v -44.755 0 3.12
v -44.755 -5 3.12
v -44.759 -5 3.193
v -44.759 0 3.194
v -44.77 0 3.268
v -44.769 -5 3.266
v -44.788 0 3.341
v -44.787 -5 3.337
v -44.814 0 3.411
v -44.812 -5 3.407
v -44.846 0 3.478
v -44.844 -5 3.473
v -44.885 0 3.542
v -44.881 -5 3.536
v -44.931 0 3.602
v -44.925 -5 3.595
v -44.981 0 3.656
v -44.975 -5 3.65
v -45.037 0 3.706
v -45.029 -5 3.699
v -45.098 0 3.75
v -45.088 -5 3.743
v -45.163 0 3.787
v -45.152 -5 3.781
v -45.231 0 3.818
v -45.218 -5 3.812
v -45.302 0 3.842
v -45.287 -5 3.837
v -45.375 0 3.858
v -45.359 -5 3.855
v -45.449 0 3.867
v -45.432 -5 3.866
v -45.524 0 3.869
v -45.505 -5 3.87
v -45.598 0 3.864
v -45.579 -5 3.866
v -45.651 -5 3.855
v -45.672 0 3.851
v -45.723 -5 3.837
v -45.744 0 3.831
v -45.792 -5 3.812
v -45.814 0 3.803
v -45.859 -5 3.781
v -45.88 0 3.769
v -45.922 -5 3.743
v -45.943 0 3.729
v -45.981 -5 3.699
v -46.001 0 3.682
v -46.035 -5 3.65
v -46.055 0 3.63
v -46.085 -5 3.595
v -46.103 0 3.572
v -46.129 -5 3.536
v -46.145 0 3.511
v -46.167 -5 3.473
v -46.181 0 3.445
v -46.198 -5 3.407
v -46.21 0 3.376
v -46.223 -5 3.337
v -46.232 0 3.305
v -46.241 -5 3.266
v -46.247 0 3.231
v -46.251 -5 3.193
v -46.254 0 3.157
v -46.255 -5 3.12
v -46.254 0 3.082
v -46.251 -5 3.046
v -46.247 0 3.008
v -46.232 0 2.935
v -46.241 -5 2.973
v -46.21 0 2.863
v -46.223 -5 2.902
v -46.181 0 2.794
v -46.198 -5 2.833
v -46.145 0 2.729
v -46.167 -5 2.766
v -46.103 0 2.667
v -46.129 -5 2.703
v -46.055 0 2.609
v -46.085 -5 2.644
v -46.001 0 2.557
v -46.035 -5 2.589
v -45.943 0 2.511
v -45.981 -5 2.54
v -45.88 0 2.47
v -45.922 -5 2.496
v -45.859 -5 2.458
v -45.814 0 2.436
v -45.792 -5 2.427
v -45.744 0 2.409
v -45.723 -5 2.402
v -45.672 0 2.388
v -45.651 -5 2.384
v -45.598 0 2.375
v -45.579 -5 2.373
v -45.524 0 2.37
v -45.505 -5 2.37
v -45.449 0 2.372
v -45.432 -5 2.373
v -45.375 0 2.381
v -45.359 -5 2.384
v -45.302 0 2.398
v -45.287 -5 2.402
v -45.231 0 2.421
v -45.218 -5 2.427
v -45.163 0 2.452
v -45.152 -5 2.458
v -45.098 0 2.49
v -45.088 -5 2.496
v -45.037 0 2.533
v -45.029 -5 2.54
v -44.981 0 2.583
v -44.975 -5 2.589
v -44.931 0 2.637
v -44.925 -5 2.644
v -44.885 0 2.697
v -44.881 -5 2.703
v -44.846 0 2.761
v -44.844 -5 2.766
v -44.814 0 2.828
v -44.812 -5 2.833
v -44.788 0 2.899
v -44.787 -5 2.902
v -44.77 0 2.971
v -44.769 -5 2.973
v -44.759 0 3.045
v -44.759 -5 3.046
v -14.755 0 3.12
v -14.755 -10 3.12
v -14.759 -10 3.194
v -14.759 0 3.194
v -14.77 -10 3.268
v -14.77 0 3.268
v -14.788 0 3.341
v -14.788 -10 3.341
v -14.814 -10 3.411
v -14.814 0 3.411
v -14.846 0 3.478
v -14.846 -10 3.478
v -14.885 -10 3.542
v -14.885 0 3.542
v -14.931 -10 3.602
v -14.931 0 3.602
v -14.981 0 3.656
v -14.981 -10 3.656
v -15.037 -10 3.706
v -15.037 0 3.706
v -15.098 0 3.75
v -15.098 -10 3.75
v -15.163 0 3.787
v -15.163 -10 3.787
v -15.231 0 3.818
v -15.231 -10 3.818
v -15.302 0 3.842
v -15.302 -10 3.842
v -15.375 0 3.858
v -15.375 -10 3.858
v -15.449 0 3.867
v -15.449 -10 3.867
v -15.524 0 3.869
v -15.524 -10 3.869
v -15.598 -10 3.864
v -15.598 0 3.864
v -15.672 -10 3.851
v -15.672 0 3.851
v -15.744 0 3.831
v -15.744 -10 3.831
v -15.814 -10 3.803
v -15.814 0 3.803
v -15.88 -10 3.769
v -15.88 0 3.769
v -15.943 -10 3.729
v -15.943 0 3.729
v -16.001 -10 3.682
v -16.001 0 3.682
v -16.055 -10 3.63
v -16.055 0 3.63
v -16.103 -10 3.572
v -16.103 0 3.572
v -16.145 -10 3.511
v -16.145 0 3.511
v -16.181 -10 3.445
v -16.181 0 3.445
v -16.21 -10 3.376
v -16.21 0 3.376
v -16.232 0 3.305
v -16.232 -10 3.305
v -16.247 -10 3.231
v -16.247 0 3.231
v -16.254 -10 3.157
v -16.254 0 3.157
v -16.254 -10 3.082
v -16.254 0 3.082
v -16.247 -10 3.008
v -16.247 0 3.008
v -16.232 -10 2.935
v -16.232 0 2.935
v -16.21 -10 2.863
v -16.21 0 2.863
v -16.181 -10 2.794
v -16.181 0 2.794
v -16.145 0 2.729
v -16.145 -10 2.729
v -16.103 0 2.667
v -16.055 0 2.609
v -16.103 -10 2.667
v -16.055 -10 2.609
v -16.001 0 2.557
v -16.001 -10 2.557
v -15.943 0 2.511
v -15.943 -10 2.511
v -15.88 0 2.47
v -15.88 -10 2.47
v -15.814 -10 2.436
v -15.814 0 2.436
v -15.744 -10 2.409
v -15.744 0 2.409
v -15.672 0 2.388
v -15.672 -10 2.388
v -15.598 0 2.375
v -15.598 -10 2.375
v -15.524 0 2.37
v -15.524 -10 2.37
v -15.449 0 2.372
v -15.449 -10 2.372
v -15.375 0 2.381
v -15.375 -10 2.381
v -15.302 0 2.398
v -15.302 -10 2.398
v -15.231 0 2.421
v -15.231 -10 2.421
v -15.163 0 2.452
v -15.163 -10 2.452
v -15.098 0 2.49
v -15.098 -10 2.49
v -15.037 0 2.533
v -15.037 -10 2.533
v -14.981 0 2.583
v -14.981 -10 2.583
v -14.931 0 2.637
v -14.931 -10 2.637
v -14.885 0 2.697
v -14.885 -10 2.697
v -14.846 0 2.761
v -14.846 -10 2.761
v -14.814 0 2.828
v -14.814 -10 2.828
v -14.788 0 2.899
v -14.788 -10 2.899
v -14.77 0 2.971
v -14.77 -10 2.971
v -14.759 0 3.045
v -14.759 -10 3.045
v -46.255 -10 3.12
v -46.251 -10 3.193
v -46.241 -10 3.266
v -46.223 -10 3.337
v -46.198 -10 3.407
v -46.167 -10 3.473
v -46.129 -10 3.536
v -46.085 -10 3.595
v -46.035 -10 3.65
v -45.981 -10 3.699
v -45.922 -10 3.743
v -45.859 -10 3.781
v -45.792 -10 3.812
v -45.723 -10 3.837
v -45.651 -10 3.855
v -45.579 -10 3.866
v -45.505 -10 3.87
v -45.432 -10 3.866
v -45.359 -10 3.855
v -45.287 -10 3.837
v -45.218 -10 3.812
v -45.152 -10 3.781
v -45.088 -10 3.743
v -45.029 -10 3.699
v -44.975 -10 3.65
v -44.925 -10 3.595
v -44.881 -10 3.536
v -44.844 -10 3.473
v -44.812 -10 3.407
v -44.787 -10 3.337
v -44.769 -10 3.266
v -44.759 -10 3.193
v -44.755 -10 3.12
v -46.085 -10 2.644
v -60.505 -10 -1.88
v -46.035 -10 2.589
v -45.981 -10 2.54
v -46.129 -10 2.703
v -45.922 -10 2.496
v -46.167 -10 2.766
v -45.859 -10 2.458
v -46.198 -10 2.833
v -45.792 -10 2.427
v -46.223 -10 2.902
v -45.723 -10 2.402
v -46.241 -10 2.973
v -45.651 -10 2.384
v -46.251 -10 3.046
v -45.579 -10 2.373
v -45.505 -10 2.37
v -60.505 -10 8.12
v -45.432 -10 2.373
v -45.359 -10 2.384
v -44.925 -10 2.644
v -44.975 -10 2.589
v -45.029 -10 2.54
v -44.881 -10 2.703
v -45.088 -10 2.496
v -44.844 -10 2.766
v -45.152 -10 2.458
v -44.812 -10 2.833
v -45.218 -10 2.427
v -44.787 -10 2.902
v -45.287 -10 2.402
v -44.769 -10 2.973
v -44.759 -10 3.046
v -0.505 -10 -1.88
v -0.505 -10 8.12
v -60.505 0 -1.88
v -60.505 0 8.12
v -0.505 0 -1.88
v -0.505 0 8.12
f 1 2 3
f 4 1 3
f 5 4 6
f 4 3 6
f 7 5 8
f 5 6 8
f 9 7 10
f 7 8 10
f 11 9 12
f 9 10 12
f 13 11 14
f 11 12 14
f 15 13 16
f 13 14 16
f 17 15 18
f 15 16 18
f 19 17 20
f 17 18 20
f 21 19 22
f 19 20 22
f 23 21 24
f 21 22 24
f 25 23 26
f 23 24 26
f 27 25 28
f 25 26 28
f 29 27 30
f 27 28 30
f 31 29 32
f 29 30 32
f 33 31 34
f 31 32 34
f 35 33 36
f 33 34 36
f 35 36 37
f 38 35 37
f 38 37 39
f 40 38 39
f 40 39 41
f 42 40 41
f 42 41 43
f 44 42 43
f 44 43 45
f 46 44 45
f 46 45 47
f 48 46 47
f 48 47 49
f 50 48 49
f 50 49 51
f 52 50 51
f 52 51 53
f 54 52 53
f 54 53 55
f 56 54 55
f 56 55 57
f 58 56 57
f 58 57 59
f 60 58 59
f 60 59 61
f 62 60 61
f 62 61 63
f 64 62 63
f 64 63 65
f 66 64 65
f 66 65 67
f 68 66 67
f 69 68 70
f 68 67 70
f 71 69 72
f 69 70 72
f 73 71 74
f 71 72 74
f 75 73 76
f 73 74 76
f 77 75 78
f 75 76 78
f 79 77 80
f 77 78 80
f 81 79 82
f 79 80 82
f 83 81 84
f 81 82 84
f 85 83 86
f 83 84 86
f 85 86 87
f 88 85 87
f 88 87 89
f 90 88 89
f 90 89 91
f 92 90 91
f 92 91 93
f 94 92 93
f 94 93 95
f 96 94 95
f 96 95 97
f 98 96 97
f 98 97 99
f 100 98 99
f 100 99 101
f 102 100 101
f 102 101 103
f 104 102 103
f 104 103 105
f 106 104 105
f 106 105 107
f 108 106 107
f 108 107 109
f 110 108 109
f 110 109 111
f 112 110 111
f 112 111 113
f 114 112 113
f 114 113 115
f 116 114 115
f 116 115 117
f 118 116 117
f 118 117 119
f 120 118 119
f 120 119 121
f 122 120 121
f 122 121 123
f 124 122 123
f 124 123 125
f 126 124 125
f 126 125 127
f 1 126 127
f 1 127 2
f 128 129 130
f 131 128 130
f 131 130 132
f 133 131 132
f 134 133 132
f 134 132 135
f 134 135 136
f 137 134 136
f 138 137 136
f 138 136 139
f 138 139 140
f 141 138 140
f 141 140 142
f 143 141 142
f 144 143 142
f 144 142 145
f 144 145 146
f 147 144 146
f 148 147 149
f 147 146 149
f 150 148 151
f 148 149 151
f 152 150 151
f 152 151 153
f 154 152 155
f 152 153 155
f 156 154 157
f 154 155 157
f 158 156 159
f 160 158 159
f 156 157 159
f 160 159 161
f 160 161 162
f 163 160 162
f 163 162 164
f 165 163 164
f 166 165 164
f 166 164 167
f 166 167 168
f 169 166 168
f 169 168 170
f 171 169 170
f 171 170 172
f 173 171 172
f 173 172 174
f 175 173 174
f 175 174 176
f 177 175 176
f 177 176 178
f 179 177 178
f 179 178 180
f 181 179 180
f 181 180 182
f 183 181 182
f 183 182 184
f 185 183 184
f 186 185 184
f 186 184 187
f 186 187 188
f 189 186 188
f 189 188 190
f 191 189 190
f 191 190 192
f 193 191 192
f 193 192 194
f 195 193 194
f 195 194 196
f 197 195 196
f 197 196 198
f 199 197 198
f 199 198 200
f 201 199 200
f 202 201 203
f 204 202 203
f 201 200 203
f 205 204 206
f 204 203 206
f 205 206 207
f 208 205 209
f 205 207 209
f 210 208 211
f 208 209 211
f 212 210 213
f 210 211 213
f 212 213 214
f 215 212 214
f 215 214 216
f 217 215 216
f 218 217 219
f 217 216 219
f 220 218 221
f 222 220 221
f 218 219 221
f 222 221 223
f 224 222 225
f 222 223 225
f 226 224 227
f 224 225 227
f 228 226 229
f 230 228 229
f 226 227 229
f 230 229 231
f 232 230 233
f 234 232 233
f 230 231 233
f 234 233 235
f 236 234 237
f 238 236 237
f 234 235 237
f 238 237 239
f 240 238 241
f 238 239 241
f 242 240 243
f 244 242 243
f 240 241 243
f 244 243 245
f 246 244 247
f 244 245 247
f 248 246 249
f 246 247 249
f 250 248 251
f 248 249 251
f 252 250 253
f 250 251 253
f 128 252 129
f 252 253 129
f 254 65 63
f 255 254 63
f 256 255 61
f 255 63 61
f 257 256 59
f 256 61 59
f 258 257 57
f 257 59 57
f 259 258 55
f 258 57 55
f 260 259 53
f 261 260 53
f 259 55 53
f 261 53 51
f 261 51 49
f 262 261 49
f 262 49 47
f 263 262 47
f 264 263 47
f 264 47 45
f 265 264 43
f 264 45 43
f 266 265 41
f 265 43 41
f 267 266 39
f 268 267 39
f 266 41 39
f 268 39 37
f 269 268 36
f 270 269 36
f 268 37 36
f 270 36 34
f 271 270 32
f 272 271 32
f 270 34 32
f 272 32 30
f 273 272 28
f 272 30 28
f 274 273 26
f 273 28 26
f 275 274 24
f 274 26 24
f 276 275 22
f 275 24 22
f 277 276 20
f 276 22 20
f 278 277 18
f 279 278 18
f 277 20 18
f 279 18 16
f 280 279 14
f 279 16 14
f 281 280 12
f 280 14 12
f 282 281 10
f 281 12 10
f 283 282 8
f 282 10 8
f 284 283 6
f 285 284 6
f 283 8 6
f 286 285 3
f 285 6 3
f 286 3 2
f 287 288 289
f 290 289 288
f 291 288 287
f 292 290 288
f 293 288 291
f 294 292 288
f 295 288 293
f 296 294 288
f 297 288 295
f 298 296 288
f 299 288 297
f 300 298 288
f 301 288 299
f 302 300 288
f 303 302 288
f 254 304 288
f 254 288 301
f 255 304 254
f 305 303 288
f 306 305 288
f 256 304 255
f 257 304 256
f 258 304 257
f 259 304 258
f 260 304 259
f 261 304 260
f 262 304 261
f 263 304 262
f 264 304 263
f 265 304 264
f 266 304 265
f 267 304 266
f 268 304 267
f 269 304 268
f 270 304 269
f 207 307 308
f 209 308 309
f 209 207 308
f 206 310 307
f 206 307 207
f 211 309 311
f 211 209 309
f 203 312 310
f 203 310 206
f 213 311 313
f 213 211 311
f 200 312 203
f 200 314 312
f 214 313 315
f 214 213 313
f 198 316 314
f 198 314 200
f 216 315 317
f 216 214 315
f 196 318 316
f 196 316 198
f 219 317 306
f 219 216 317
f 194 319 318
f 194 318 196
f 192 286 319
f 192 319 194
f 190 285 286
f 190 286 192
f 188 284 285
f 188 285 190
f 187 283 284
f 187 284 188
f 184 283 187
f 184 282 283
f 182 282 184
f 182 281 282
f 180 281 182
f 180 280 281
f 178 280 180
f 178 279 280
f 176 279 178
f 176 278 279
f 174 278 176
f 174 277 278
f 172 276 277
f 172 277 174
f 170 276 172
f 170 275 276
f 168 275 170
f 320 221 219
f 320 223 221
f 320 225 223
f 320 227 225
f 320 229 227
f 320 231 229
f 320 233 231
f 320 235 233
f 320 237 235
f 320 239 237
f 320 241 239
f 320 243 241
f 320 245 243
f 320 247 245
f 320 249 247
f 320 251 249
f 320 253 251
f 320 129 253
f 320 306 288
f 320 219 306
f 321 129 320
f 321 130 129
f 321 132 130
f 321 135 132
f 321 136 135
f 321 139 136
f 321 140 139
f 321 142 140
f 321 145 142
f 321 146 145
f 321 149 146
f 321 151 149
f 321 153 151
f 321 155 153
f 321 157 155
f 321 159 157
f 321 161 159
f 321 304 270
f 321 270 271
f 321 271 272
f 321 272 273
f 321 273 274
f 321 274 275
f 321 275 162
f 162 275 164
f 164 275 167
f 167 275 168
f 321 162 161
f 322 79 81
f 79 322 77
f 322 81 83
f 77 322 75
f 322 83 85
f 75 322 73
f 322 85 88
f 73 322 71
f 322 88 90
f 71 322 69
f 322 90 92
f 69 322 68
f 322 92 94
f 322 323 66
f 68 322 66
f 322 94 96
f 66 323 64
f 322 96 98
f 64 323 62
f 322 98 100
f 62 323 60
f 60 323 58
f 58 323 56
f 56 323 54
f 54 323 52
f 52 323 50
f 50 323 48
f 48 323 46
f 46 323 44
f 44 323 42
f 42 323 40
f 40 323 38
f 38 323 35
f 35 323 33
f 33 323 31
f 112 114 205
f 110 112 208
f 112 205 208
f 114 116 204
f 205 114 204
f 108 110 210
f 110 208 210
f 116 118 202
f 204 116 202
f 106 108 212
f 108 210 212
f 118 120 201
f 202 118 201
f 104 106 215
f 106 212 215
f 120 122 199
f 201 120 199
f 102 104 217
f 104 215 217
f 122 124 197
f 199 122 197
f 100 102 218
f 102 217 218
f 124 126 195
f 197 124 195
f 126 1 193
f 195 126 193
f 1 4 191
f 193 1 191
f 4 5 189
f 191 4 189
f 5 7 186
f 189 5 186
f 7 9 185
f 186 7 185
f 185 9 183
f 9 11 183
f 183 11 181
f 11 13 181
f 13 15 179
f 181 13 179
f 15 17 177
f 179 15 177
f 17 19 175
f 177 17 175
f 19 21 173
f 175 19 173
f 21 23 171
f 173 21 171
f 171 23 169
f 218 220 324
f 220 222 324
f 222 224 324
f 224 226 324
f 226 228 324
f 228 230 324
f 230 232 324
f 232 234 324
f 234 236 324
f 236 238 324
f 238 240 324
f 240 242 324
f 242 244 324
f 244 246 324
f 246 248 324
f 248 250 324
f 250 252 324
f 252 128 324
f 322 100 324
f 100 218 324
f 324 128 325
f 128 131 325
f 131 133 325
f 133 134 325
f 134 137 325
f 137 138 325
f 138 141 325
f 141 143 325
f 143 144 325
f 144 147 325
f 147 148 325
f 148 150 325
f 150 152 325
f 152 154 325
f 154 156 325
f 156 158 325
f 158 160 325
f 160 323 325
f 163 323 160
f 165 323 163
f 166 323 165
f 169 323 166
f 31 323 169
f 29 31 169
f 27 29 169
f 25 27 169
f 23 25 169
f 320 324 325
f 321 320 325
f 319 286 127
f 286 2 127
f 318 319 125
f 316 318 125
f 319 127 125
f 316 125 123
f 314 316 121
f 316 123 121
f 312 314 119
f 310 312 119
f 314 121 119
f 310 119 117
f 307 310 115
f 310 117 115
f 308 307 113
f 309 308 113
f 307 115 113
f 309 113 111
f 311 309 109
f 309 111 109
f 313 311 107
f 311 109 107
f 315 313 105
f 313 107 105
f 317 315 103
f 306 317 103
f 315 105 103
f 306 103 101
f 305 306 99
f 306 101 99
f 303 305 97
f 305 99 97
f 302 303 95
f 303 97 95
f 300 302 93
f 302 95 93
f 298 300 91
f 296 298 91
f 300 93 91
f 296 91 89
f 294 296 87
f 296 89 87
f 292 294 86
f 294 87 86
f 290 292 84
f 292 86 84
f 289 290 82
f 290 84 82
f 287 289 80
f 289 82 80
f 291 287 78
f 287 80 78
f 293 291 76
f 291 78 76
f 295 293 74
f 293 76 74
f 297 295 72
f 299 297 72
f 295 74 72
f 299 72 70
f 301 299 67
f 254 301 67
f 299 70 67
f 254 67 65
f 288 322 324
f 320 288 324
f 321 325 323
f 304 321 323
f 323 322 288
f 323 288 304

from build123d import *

# Parameters (mm, degrees)
F0_W     = 15
F0_H     = 10
F0_W_2   = 30
F1_DEPTH = 10
F3_D     = 1.5
F3_DEPTH = 5
F2_R     = 0.75
F4_DEPTH = 25


with BuildPart() as f1:
    # F0 (on Front) → F1 (new body)
    with BuildSketch(Plane.XZ):
        with Locations((-53.005068, 3.119589)):
            Rectangle(F0_W, F0_H)
        with Locations((-30.505068, 3.119589)):
            Rectangle(F0_W_2, F0_H)
        with Locations((-8.005068, 3.119589)):
            Rectangle(F0_W, F0_H)
    extrude(amount=F1_DEPTH)

    # F3
    with Locations(Plane.XZ.offset(10)):
        with Locations((-45.505068, 3.119589)):
            Hole(F3_D / 2, depth=F3_DEPTH)

    # F2 (on face) → F4 (cut)
    with BuildSketch(Plane.XZ.offset(10)):
        with Locations((-45.505068, 3.119589)):
            Circle(F2_R)
        with Locations((-15.505068, 3.119589)):
            Circle(F2_R)
    extrude(amount=-F4_DEPTH, mode=Mode.SUBTRACT)


solid = f1.part
